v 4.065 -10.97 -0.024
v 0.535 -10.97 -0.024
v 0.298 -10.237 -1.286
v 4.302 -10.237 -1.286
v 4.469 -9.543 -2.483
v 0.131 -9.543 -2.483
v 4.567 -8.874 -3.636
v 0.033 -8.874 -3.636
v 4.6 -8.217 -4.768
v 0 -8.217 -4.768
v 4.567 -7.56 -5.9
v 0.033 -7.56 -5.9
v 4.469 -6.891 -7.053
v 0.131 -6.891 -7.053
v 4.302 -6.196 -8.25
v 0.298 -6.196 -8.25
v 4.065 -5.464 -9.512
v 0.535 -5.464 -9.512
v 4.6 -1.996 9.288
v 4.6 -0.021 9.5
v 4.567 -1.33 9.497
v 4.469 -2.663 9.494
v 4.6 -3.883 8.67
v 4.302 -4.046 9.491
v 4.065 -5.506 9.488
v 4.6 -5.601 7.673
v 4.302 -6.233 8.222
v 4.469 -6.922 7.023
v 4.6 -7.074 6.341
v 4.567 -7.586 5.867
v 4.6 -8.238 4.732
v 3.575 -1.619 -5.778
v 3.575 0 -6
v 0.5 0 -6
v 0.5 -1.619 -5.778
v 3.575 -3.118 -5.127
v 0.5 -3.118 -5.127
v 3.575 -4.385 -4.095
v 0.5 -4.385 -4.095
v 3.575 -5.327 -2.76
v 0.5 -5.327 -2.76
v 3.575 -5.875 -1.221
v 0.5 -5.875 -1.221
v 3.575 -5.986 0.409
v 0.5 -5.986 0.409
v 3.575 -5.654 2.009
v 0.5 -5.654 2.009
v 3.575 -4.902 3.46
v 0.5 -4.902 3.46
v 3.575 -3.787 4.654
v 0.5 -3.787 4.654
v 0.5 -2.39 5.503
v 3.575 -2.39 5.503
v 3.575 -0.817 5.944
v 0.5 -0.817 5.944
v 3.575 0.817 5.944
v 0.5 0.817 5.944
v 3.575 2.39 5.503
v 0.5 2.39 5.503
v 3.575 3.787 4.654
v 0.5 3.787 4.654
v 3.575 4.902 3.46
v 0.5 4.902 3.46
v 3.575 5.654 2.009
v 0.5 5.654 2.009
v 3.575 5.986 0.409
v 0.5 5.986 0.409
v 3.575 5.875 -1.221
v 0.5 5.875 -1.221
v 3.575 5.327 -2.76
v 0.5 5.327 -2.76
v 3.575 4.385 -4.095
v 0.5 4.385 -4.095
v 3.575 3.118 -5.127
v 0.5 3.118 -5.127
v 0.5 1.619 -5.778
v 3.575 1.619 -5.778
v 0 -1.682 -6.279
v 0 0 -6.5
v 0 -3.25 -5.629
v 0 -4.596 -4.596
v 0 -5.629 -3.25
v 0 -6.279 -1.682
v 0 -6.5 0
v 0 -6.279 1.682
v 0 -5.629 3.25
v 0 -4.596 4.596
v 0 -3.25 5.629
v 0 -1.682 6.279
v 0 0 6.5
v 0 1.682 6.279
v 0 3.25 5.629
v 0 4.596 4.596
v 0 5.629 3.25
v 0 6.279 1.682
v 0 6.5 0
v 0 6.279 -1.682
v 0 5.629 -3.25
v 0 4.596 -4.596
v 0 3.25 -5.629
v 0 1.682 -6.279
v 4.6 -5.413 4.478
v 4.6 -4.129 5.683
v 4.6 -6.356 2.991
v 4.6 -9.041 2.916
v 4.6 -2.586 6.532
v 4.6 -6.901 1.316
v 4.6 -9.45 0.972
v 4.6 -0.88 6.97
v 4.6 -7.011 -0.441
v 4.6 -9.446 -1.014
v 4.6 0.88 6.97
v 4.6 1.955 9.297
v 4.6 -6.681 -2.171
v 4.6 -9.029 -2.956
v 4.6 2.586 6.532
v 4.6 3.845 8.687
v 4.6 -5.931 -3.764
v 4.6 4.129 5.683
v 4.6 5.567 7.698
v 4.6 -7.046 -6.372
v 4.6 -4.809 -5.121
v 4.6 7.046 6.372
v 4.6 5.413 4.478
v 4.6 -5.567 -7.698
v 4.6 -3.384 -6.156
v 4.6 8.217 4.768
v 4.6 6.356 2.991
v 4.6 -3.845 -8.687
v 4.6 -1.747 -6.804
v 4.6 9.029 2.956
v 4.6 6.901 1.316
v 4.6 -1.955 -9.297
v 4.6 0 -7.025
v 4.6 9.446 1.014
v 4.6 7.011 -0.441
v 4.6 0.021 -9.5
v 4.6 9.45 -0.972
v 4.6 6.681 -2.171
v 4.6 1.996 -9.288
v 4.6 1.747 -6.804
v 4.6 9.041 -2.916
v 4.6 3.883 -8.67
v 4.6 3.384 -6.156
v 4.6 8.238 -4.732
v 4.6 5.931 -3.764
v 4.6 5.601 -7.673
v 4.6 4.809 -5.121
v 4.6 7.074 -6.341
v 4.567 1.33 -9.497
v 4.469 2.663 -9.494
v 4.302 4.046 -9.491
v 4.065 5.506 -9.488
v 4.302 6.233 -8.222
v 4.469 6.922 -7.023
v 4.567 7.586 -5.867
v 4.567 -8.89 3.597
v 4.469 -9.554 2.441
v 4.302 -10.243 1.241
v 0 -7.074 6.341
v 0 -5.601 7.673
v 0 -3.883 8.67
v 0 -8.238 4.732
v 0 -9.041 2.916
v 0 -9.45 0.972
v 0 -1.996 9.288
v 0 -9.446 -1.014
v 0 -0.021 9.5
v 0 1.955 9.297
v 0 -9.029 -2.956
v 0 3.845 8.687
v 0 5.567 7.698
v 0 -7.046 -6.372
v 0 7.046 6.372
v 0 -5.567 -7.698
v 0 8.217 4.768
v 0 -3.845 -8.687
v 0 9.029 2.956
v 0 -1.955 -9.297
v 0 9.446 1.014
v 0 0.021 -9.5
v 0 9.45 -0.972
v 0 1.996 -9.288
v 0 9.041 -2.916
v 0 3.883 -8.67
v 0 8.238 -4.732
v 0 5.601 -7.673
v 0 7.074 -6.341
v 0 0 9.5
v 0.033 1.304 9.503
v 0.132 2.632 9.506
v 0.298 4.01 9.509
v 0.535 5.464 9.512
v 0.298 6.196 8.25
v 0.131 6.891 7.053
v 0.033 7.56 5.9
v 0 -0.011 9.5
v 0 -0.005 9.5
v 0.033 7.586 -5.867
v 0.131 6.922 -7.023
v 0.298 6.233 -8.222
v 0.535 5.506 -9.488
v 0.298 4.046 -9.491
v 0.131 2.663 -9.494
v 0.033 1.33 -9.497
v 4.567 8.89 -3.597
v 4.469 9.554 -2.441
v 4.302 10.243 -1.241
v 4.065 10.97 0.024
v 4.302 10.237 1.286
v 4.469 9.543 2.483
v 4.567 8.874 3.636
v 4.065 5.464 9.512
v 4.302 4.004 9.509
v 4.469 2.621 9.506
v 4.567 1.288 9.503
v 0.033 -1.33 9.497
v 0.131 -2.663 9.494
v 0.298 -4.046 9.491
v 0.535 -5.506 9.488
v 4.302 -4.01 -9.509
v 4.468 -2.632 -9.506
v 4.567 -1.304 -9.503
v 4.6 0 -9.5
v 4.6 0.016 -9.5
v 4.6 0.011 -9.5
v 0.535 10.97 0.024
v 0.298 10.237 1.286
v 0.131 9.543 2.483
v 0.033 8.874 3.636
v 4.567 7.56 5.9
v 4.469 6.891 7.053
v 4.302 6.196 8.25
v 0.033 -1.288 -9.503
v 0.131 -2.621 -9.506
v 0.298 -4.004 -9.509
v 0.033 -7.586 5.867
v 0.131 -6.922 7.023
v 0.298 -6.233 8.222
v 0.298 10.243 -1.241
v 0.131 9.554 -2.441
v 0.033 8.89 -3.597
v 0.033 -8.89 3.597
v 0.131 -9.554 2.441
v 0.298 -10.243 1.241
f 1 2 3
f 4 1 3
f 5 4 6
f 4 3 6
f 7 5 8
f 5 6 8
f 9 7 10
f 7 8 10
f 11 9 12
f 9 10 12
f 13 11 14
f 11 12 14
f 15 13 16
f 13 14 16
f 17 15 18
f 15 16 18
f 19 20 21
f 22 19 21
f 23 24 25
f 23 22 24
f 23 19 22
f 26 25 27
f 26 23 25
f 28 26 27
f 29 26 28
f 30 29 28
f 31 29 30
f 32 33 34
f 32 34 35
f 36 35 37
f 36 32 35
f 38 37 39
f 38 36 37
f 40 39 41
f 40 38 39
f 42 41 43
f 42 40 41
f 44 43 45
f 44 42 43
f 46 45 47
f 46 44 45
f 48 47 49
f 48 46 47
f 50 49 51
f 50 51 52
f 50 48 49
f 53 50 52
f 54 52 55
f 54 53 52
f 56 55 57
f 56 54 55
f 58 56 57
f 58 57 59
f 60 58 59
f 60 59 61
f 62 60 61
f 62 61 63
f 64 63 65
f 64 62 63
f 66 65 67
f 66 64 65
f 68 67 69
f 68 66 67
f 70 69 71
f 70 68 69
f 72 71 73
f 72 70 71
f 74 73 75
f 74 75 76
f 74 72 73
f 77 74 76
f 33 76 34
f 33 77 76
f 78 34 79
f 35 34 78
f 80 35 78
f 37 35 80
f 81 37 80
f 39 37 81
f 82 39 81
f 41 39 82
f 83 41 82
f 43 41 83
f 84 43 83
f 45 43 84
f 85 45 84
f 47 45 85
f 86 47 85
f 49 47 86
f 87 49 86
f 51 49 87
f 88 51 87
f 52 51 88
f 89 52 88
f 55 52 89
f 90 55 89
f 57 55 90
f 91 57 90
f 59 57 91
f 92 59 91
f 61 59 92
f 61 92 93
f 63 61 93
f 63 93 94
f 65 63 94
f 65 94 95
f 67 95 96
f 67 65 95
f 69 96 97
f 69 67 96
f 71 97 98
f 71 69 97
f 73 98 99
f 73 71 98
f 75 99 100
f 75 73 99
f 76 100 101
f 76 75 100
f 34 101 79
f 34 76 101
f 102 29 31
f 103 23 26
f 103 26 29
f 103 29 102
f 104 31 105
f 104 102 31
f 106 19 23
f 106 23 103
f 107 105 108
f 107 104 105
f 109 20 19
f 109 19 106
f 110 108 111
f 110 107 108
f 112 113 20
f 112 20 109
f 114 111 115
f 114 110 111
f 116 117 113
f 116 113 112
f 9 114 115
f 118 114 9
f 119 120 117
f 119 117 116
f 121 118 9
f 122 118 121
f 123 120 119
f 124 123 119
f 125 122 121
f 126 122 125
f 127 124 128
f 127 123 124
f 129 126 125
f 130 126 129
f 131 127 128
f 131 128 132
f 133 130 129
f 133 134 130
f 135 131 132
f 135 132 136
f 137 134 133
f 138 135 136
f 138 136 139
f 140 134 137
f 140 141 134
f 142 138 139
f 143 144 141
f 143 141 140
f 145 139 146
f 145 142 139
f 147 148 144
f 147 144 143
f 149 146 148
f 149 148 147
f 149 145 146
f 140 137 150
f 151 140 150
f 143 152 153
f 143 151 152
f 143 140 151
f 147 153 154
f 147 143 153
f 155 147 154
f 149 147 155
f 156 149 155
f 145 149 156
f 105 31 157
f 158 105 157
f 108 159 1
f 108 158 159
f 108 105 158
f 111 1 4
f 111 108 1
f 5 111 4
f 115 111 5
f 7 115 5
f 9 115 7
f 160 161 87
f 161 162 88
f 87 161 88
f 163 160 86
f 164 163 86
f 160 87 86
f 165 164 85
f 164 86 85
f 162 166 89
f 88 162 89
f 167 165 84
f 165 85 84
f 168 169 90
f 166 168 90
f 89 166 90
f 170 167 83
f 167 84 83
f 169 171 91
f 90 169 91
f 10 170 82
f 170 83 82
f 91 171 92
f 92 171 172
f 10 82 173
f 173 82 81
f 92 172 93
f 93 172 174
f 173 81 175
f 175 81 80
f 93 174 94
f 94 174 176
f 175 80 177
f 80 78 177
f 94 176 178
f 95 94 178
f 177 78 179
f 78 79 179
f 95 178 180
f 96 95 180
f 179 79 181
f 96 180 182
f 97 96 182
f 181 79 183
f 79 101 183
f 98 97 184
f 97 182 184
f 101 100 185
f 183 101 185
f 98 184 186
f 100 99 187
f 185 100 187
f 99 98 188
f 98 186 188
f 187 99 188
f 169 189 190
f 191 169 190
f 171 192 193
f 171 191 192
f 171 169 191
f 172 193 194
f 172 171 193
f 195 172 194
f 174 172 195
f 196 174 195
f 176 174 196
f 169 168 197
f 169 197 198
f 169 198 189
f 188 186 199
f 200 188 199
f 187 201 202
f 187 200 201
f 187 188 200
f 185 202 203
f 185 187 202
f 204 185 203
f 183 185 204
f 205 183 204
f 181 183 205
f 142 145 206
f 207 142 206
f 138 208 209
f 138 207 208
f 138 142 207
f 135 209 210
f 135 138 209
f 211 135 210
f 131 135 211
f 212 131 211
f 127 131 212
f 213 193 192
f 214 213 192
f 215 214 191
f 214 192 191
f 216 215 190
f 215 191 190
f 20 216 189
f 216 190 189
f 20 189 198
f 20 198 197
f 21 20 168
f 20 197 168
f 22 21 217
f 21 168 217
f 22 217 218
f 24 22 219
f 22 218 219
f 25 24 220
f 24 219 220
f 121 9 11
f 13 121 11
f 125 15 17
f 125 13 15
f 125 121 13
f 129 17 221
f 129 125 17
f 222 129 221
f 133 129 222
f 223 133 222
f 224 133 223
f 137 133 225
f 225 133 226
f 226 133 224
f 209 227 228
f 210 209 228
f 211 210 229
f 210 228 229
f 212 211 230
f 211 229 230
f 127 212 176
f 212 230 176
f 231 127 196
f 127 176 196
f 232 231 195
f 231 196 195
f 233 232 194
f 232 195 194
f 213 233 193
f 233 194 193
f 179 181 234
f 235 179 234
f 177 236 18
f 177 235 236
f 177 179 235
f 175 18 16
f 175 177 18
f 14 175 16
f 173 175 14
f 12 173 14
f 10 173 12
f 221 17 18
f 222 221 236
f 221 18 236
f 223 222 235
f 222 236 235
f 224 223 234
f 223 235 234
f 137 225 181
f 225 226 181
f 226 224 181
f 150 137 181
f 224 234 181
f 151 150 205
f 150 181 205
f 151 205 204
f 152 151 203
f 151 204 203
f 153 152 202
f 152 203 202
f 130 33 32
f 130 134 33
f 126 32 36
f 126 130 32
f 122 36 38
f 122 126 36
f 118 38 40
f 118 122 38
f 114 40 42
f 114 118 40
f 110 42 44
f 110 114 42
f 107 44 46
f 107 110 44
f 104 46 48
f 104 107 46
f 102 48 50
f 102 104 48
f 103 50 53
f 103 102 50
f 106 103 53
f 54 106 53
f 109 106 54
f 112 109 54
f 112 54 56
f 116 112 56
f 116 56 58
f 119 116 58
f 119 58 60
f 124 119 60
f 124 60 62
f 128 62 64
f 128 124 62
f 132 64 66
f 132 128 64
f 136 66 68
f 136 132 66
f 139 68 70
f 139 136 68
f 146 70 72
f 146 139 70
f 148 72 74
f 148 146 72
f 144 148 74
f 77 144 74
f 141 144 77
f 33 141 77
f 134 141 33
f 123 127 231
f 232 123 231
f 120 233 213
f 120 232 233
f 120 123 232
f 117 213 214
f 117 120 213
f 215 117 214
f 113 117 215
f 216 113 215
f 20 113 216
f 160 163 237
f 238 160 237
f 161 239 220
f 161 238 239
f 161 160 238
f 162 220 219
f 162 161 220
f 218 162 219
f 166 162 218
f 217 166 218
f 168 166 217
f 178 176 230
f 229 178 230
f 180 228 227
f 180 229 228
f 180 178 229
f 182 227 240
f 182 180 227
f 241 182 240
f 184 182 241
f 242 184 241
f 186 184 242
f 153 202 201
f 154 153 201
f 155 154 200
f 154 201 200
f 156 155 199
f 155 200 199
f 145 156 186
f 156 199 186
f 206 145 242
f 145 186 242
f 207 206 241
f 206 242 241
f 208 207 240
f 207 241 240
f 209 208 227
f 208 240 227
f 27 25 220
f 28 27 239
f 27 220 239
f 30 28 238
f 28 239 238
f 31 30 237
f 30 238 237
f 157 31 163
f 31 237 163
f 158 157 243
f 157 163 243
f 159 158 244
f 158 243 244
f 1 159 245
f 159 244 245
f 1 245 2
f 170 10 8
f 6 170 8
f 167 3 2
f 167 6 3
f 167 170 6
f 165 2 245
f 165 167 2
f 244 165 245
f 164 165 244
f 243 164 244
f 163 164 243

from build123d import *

# Parameters (mm, degrees)
RESSALTO_EXTRUS_O1_DEPTH = 4.6
CHANFRO1_SIZE            = 0.5
ESBO_O8_OUTSIDE_W        = 98.338
ESBO_O8_OUTSIDE_H        = 101.254
ESBO_O8_OUTSIDE_R        = 9.5
CORTE_EXTRUS_O1_DEPTH    = 13
CORTE_EXTRUS_O1_DRAFT    = -70
ESBO_O9_OUTSIDE_W        = 98.338
ESBO_O9_OUTSIDE_H        = 101.254
ESBO_O9_OUTSIDE_R        = 9.5
CORTE_EXTRUS_O2_DEPTH    = 13
CORTE_EXTRUS_O2_DRAFT    = -70


with BuildPart() as part:
    # Esboço1 → Ressalto-extrusão1 (new body)
    with BuildSketch(Plane(origin=(0, 0, 0), x_dir=(0, 0, -1), z_dir=(1, 0, 0))):
        Polygon((9.487887431, 5.505753848), (-0.024178983, 10.969628467), (-9.512066414, 5.46387462), (-9.487887431, -5.505753848), (0.024178983, -10.969628467), (9.512066414, -5.46387462), align=None)
    extrude(amount=RESSALTO_EXTRUS_O1_DEPTH)

    # Esboço6 → Furo roscado de M141 (revolve, cut)
    with BuildSketch(Plane(origin=(4.6, 0, 0), x_dir=(0, 0, -1), z_dir=(0, 1, 0))):
        Polygon((0, 0), (0, 4.6), (6, 4.6), (6, 1.025), (7.025, 0), align=None)
    revolve(axis=Axis((10.95, 0, 0), (-1, 0, 0)), mode=Mode.SUBTRACT)

    # Chanfro1
    chanfro1_edges = [part.edges().sort_by_distance(p)[0] for p in [
        (0, 0, 6),
    ]]
    chamfer(chanfro1_edges, length=CHANFRO1_SIZE)


with BuildPart() as corte_extrus_o1_tool:
    # Esboço8 outside → Corte-extrusão1 (with draft: the straight prism first)
    with BuildSketch(Plane.ZY):
        Rectangle(ESBO_O8_OUTSIDE_W, ESBO_O8_OUTSIDE_H)
        Circle(ESBO_O8_OUTSIDE_R, mode=Mode.SUBTRACT)
    extrude(amount=-CORTE_EXTRUS_O1_DEPTH)
    # Corte-extrusão1: the draft: its side faces are tilted about the plane it starts from
    corte_extrus_o1_sides = [corte_extrus_o1_tool.faces().sort_by_distance(p)[0] for p in [
        (6.5, -50.627, 0),
        (6.5, 0, 49.169),
        (6.5, 50.627, 0),
        (6.5, 0, -49.169),
        (6.5, 0, -9.5),
    ]]
    draft(corte_extrus_o1_sides, Plane.ZY, CORTE_EXTRUS_O1_DRAFT)


with BuildPart() as part_1:
    add(part.part)

    # Corte-extrusão1: cut by corte_extrus_o1_tool
    add(corte_extrus_o1_tool.part, mode=Mode.SUBTRACT)


with BuildPart() as corte_extrus_o2_tool:
    # Esboço9 outside → Corte-extrusão2 (with draft: the straight prism first)
    with BuildSketch(Plane(origin=(4.6, 0, 0), x_dir=(0, 0, -1), z_dir=(1, 0, 0))):
        Rectangle(ESBO_O9_OUTSIDE_W, ESBO_O9_OUTSIDE_H)
        Circle(ESBO_O9_OUTSIDE_R, mode=Mode.SUBTRACT)
    extrude(amount=-CORTE_EXTRUS_O2_DEPTH)
    # Corte-extrusão2: the draft: its side faces are tilted about the plane it starts from
    corte_extrus_o2_sides = [corte_extrus_o2_tool.faces().sort_by_distance(p)[0] for p in [
        (-1.9, -50.627, 0),
        (-1.9, 0, -49.169),
        (-1.9, 50.627, 0),
        (-1.9, 0, 49.169),
        (-1.9, 0, 9.5),
    ]]
    draft(corte_extrus_o2_sides, Plane(origin=(4.6, 0, 0), x_dir=(0, 0, -1), z_dir=(1, 0, 0)), CORTE_EXTRUS_O2_DRAFT)


with BuildPart() as part_2:
    add(part_1.part)

    # Corte-extrusão2: cut by corte_extrus_o2_tool
    add(corte_extrus_o2_tool.part, mode=Mode.SUBTRACT)


solid = part_2.part
